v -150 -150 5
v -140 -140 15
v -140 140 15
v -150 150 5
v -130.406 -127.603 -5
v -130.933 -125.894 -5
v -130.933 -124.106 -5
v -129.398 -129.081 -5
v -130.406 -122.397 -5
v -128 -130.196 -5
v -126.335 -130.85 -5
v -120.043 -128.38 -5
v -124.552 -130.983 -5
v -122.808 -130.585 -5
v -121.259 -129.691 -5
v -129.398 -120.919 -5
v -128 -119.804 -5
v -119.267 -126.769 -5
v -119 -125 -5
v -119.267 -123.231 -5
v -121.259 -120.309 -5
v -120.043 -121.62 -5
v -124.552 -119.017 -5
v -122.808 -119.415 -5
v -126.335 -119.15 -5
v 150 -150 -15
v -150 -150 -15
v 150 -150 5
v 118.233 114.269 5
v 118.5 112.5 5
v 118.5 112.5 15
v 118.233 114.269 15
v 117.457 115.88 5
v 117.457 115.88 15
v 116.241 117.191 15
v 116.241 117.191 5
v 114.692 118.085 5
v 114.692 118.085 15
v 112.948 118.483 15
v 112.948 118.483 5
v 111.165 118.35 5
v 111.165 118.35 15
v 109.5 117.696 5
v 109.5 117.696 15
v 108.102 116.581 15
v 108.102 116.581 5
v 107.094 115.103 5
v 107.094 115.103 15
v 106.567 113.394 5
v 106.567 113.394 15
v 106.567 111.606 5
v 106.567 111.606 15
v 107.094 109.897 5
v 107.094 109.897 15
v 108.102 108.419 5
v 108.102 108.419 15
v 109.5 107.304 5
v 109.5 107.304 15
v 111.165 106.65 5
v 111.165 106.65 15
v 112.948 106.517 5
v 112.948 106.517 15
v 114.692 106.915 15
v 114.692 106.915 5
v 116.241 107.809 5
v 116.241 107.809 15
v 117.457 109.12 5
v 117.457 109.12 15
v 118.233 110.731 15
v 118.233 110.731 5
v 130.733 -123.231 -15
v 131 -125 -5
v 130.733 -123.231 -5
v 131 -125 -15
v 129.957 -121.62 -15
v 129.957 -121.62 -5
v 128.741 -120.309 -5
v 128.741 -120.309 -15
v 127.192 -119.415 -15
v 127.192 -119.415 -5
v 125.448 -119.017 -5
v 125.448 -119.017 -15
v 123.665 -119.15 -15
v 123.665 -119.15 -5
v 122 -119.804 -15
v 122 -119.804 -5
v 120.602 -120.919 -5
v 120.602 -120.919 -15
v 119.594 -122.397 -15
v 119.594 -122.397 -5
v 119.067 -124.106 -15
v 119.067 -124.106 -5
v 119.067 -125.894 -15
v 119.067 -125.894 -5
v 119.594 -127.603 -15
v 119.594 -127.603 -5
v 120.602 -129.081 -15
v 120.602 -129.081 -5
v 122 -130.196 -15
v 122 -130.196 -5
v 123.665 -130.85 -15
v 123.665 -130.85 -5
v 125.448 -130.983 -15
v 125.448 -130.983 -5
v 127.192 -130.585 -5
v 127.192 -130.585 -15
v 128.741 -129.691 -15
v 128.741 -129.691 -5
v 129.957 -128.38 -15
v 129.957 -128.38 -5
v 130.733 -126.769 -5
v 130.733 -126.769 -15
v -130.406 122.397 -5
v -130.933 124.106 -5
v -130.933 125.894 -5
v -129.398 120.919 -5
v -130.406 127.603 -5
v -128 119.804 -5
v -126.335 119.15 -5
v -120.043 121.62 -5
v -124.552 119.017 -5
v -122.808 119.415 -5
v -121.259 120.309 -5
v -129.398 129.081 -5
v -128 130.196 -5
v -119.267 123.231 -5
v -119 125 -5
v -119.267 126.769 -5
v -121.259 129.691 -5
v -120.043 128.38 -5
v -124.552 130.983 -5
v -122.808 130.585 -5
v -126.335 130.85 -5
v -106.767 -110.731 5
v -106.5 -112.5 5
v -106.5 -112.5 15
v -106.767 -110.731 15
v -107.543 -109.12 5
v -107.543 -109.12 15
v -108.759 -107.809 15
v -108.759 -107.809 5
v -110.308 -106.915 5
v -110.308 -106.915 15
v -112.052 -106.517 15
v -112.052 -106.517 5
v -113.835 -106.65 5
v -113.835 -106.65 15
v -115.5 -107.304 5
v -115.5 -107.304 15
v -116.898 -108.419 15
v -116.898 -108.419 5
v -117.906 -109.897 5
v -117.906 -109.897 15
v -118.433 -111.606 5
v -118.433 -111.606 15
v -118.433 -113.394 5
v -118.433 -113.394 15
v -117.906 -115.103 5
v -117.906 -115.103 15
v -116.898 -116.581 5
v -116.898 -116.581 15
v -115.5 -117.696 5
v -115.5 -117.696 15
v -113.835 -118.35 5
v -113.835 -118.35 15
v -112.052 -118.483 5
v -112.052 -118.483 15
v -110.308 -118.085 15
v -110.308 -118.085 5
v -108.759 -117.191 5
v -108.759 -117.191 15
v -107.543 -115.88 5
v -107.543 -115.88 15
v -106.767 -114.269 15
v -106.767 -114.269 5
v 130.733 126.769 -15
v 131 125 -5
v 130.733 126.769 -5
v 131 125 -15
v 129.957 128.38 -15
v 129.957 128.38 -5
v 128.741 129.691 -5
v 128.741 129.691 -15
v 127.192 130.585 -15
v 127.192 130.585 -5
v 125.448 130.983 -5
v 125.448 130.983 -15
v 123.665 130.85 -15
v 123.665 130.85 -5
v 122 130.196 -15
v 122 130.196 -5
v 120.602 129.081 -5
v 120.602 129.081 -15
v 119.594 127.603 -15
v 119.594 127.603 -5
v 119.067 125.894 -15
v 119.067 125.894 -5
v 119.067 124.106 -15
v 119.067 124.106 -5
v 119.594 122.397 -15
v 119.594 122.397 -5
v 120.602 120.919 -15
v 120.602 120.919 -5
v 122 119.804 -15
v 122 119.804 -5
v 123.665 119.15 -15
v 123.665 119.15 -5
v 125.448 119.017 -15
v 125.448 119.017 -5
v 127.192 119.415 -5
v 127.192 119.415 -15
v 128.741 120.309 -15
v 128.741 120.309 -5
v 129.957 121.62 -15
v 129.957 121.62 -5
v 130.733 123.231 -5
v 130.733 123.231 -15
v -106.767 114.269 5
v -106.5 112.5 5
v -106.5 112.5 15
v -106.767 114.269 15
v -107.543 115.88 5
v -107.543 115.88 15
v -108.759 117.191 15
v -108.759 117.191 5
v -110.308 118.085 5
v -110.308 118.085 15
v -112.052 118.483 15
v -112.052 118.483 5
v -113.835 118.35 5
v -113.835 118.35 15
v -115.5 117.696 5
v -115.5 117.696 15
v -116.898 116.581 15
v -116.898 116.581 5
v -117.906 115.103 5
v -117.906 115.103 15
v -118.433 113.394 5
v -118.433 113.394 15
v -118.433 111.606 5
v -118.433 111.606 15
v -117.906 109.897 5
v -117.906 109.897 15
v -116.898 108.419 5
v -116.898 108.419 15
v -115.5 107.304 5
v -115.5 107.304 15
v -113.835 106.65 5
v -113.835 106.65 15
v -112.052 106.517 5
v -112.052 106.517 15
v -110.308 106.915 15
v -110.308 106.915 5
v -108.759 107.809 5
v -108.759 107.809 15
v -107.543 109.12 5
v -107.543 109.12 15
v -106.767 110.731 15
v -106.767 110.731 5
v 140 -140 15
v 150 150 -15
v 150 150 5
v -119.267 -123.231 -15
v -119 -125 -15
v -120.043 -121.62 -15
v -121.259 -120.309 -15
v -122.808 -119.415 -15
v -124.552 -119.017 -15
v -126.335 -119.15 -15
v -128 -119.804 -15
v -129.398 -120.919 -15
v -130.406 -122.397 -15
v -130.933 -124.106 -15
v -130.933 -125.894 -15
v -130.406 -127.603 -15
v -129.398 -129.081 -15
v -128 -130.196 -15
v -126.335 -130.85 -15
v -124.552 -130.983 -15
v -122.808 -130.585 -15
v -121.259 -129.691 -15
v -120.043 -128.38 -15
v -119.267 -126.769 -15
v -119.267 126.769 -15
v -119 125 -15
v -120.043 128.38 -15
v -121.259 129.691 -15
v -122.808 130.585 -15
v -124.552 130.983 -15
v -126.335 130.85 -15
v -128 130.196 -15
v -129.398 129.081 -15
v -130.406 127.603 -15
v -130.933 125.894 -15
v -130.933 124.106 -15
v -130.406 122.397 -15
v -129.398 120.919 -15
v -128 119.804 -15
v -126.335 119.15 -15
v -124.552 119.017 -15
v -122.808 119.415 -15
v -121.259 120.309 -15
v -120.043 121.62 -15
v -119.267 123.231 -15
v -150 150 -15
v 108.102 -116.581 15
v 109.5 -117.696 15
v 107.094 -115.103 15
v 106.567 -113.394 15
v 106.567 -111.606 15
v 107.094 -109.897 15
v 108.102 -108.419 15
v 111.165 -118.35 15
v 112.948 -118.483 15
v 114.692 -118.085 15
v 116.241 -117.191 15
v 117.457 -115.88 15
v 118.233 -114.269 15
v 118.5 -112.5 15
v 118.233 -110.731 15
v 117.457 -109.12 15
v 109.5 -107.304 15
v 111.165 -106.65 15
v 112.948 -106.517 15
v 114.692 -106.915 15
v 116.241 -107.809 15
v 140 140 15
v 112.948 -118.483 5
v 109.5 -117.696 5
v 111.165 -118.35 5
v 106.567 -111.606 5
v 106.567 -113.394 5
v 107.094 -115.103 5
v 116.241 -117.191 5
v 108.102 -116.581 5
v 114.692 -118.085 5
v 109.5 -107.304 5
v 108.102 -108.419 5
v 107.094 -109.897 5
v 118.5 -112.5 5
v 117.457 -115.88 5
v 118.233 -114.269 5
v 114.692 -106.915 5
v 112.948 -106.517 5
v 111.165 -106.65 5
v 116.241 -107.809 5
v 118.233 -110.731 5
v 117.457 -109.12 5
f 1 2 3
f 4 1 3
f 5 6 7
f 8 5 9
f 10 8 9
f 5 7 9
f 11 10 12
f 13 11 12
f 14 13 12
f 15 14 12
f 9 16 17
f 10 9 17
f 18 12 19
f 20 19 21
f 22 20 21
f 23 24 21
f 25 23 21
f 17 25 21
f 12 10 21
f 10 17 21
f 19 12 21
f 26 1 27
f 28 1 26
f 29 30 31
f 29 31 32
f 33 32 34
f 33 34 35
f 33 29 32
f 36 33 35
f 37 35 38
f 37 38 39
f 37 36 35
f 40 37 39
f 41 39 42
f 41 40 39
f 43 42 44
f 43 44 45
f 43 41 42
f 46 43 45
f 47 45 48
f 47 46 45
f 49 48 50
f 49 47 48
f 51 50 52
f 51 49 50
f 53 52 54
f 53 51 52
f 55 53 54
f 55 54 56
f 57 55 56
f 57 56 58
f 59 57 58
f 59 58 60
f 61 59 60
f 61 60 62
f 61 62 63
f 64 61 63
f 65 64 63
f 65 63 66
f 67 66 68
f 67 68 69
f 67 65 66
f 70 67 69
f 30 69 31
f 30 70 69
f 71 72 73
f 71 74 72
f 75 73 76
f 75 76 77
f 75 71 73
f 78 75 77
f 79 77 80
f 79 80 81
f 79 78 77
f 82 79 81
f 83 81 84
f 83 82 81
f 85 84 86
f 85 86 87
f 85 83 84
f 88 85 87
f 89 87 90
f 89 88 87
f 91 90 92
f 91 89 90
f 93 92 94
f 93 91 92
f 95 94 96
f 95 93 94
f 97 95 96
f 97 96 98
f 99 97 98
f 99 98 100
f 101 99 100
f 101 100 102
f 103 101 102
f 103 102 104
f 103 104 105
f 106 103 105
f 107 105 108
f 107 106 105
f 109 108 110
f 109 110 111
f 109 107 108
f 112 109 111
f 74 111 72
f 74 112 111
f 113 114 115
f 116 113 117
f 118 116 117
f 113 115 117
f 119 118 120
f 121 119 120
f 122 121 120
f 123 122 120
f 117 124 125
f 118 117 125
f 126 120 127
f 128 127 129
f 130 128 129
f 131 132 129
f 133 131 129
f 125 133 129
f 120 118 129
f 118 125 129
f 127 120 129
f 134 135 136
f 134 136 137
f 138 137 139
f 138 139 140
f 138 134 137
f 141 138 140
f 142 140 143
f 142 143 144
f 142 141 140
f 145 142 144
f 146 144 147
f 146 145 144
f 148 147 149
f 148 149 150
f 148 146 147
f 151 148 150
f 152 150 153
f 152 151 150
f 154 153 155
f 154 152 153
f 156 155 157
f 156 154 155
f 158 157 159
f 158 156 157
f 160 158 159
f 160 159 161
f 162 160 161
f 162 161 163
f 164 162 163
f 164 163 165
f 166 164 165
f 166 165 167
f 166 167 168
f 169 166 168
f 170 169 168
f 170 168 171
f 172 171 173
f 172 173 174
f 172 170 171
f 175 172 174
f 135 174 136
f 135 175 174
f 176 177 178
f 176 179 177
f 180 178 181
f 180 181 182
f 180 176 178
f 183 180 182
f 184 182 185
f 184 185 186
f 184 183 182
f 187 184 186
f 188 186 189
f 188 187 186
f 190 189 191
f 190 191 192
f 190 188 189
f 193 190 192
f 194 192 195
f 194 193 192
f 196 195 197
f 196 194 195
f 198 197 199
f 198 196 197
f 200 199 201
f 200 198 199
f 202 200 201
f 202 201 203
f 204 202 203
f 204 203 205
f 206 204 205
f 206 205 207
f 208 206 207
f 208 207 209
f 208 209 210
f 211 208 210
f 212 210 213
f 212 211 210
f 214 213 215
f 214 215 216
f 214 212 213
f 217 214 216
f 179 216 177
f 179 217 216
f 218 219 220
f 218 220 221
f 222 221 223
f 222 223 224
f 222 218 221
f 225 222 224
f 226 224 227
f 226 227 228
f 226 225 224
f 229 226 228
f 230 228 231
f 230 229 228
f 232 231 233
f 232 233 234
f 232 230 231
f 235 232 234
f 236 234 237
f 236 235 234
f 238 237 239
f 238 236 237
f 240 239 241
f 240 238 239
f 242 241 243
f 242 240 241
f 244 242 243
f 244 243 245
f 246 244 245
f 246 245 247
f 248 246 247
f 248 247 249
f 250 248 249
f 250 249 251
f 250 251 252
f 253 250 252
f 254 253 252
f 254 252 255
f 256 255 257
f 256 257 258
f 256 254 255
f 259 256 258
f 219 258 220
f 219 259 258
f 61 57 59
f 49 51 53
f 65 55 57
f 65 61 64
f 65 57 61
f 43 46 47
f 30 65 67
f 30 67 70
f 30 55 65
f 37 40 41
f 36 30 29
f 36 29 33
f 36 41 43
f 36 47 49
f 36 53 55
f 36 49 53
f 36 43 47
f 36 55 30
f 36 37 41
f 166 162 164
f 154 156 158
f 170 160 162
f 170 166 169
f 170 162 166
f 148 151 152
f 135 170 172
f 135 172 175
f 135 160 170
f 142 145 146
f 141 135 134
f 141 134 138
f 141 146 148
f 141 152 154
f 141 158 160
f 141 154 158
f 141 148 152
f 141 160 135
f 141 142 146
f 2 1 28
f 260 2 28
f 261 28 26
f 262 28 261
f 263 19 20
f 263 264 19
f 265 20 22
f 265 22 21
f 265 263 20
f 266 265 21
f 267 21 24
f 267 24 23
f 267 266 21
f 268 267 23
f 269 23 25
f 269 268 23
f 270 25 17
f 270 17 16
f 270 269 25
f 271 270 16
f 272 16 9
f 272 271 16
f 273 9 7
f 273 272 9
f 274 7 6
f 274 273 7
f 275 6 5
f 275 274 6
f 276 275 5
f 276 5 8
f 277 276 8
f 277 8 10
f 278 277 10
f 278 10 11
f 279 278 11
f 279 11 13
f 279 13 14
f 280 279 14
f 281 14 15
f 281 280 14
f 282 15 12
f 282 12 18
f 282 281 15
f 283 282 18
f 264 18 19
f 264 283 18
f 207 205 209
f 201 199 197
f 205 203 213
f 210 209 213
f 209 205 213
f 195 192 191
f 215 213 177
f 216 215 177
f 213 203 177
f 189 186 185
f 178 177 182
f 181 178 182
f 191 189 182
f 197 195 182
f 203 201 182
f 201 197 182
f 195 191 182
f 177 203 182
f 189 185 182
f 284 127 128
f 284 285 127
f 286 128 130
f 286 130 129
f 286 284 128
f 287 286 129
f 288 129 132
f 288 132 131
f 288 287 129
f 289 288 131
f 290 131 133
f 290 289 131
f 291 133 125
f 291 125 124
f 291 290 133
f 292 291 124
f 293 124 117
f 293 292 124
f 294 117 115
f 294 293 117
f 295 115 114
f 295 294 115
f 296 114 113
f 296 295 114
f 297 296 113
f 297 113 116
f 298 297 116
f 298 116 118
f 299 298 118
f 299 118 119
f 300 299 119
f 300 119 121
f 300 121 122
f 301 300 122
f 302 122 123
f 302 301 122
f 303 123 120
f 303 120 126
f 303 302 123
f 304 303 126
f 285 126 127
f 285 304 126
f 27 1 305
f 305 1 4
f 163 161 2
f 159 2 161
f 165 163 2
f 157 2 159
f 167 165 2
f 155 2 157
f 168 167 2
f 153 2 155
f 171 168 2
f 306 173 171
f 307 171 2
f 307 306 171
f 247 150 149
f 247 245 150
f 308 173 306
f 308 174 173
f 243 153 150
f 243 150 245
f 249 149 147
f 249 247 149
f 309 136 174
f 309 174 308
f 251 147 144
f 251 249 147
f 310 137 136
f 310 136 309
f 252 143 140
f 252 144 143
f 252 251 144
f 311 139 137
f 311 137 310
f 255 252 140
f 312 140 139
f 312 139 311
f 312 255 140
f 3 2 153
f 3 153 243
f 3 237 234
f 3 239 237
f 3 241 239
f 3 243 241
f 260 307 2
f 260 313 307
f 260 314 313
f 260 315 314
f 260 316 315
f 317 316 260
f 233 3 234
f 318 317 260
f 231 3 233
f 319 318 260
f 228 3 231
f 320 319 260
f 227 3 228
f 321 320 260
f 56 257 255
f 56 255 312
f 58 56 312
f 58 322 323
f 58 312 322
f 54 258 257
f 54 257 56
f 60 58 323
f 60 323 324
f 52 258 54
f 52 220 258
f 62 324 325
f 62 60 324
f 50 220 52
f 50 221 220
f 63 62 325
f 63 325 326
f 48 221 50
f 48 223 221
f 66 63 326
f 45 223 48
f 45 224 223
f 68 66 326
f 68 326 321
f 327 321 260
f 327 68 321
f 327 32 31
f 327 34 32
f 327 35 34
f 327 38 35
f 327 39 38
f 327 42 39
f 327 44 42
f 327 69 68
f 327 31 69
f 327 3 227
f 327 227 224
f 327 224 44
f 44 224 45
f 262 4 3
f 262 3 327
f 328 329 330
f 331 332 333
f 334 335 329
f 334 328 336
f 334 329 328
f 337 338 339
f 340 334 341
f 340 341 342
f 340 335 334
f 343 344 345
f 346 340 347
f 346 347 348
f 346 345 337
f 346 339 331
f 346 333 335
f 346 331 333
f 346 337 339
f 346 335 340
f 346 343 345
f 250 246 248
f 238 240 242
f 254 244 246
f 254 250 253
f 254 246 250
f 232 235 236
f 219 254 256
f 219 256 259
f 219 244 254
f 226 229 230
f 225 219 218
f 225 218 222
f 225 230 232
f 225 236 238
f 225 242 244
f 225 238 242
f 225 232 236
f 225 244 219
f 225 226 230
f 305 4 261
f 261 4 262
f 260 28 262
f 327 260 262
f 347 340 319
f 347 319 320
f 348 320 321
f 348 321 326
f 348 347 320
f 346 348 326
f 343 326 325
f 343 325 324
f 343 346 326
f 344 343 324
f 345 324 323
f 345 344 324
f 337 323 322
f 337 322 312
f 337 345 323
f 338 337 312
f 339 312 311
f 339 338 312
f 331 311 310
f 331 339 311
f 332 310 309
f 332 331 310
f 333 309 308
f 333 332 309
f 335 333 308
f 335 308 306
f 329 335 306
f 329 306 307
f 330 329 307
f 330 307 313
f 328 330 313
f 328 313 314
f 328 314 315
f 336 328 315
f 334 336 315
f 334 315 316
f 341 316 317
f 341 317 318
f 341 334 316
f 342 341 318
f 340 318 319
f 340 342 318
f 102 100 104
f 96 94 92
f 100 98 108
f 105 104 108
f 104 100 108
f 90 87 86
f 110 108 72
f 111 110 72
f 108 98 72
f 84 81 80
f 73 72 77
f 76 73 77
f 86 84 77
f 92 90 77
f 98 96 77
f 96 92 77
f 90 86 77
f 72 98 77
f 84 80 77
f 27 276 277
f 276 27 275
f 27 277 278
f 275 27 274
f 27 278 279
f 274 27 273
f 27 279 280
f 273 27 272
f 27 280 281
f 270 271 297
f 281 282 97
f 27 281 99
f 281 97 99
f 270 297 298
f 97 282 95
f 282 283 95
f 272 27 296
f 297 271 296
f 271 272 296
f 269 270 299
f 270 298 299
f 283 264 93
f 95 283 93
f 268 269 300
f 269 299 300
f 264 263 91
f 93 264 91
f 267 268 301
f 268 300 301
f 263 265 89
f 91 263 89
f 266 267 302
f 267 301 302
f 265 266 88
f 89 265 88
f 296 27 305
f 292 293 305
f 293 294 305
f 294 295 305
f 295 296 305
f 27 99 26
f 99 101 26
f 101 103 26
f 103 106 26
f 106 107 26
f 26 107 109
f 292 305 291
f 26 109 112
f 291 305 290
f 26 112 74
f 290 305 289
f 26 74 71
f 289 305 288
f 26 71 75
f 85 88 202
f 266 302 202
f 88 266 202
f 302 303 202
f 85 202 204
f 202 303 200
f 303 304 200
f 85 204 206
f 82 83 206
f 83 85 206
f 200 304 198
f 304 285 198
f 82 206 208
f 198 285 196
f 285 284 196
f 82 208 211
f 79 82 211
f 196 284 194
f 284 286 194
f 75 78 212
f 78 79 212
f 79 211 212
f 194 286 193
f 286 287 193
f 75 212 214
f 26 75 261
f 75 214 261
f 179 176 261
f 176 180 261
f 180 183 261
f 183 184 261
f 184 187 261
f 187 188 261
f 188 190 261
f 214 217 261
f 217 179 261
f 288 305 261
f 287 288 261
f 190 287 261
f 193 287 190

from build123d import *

# Parameters (mm, degrees)
F0_W          = 300
F0_H          = 300
F0_R          = 6
F1_DEPTH      = 15
F2_SIZE2      = 10
F2_SIZE       = 10
F3_DEPTH      = 5
F3_DEPTH_BACK = 15
F4_DEPTH      = 5
F4_DEPTH_BACK = 15


with BuildPart() as f1:
    # F0 (on Top) → F1 (new body, symmetric)
    with BuildSketch(Plane.XY):
        Rectangle(F0_W, F0_H)
        with Locations((-125, -125)):
            Circle(F0_R, mode=Mode.SUBTRACT)
        with Locations((-112.5, -112.5)):
            Circle(F0_R, mode=Mode.SUBTRACT)
        with Locations((125, -125)):
            Circle(F0_R, mode=Mode.SUBTRACT)
        with Locations((112.5, -112.5)):
            Circle(F0_R, mode=Mode.SUBTRACT)
        with Locations((-125, 125)):
            Circle(F0_R, mode=Mode.SUBTRACT)
        with Locations((-112.5, 112.5)):
            Circle(F0_R, mode=Mode.SUBTRACT)
        with Locations((112.5, 112.5)):
            Circle(F0_R, mode=Mode.SUBTRACT)
        with Locations((125, 125)):
            Circle(F0_R, mode=Mode.SUBTRACT)
    extrude(amount=F1_DEPTH, both=True)

    # F2
    f2_edges = [f1.edges().sort_by_distance(p)[0] for p in [
        (0, 150, 15),
        (0, -150, 15),
        (150, 0, 15),
        (-150, 0, 15),
    ]]
    chamfer(f2_edges, length=F2_SIZE, length2=F2_SIZE2)

    # F0 (on Top) → F3 (join, two sides)
    with BuildSketch(Plane.XY) as f3_sk:
        with Locations((-112.5, 112.5)):
            Circle(F0_R)
        with Locations((112.5, 112.5)):
            Circle(F0_R)
        with Locations((112.5, -112.5)):
            Circle(F0_R)
        with Locations((-112.5, -112.5)):
            Circle(F0_R)
    extrude(amount=F3_DEPTH)
    extrude(f3_sk.sketch, amount=-F3_DEPTH_BACK)

    # F0 (on Top) → F4 (join, two sides)
    with BuildSketch(Plane.XY) as f4_sk:
        with Locations((-125, 125)):
            Circle(F0_R)
        with Locations((125, 125)):
            Circle(F0_R)
        with Locations((125, -125)):
            Circle(F0_R)
        with Locations((-125, -125)):
            Circle(F0_R)
    extrude(amount=-F4_DEPTH)
    extrude(f4_sk.sketch, amount=F4_DEPTH_BACK)


solid = f1.part
